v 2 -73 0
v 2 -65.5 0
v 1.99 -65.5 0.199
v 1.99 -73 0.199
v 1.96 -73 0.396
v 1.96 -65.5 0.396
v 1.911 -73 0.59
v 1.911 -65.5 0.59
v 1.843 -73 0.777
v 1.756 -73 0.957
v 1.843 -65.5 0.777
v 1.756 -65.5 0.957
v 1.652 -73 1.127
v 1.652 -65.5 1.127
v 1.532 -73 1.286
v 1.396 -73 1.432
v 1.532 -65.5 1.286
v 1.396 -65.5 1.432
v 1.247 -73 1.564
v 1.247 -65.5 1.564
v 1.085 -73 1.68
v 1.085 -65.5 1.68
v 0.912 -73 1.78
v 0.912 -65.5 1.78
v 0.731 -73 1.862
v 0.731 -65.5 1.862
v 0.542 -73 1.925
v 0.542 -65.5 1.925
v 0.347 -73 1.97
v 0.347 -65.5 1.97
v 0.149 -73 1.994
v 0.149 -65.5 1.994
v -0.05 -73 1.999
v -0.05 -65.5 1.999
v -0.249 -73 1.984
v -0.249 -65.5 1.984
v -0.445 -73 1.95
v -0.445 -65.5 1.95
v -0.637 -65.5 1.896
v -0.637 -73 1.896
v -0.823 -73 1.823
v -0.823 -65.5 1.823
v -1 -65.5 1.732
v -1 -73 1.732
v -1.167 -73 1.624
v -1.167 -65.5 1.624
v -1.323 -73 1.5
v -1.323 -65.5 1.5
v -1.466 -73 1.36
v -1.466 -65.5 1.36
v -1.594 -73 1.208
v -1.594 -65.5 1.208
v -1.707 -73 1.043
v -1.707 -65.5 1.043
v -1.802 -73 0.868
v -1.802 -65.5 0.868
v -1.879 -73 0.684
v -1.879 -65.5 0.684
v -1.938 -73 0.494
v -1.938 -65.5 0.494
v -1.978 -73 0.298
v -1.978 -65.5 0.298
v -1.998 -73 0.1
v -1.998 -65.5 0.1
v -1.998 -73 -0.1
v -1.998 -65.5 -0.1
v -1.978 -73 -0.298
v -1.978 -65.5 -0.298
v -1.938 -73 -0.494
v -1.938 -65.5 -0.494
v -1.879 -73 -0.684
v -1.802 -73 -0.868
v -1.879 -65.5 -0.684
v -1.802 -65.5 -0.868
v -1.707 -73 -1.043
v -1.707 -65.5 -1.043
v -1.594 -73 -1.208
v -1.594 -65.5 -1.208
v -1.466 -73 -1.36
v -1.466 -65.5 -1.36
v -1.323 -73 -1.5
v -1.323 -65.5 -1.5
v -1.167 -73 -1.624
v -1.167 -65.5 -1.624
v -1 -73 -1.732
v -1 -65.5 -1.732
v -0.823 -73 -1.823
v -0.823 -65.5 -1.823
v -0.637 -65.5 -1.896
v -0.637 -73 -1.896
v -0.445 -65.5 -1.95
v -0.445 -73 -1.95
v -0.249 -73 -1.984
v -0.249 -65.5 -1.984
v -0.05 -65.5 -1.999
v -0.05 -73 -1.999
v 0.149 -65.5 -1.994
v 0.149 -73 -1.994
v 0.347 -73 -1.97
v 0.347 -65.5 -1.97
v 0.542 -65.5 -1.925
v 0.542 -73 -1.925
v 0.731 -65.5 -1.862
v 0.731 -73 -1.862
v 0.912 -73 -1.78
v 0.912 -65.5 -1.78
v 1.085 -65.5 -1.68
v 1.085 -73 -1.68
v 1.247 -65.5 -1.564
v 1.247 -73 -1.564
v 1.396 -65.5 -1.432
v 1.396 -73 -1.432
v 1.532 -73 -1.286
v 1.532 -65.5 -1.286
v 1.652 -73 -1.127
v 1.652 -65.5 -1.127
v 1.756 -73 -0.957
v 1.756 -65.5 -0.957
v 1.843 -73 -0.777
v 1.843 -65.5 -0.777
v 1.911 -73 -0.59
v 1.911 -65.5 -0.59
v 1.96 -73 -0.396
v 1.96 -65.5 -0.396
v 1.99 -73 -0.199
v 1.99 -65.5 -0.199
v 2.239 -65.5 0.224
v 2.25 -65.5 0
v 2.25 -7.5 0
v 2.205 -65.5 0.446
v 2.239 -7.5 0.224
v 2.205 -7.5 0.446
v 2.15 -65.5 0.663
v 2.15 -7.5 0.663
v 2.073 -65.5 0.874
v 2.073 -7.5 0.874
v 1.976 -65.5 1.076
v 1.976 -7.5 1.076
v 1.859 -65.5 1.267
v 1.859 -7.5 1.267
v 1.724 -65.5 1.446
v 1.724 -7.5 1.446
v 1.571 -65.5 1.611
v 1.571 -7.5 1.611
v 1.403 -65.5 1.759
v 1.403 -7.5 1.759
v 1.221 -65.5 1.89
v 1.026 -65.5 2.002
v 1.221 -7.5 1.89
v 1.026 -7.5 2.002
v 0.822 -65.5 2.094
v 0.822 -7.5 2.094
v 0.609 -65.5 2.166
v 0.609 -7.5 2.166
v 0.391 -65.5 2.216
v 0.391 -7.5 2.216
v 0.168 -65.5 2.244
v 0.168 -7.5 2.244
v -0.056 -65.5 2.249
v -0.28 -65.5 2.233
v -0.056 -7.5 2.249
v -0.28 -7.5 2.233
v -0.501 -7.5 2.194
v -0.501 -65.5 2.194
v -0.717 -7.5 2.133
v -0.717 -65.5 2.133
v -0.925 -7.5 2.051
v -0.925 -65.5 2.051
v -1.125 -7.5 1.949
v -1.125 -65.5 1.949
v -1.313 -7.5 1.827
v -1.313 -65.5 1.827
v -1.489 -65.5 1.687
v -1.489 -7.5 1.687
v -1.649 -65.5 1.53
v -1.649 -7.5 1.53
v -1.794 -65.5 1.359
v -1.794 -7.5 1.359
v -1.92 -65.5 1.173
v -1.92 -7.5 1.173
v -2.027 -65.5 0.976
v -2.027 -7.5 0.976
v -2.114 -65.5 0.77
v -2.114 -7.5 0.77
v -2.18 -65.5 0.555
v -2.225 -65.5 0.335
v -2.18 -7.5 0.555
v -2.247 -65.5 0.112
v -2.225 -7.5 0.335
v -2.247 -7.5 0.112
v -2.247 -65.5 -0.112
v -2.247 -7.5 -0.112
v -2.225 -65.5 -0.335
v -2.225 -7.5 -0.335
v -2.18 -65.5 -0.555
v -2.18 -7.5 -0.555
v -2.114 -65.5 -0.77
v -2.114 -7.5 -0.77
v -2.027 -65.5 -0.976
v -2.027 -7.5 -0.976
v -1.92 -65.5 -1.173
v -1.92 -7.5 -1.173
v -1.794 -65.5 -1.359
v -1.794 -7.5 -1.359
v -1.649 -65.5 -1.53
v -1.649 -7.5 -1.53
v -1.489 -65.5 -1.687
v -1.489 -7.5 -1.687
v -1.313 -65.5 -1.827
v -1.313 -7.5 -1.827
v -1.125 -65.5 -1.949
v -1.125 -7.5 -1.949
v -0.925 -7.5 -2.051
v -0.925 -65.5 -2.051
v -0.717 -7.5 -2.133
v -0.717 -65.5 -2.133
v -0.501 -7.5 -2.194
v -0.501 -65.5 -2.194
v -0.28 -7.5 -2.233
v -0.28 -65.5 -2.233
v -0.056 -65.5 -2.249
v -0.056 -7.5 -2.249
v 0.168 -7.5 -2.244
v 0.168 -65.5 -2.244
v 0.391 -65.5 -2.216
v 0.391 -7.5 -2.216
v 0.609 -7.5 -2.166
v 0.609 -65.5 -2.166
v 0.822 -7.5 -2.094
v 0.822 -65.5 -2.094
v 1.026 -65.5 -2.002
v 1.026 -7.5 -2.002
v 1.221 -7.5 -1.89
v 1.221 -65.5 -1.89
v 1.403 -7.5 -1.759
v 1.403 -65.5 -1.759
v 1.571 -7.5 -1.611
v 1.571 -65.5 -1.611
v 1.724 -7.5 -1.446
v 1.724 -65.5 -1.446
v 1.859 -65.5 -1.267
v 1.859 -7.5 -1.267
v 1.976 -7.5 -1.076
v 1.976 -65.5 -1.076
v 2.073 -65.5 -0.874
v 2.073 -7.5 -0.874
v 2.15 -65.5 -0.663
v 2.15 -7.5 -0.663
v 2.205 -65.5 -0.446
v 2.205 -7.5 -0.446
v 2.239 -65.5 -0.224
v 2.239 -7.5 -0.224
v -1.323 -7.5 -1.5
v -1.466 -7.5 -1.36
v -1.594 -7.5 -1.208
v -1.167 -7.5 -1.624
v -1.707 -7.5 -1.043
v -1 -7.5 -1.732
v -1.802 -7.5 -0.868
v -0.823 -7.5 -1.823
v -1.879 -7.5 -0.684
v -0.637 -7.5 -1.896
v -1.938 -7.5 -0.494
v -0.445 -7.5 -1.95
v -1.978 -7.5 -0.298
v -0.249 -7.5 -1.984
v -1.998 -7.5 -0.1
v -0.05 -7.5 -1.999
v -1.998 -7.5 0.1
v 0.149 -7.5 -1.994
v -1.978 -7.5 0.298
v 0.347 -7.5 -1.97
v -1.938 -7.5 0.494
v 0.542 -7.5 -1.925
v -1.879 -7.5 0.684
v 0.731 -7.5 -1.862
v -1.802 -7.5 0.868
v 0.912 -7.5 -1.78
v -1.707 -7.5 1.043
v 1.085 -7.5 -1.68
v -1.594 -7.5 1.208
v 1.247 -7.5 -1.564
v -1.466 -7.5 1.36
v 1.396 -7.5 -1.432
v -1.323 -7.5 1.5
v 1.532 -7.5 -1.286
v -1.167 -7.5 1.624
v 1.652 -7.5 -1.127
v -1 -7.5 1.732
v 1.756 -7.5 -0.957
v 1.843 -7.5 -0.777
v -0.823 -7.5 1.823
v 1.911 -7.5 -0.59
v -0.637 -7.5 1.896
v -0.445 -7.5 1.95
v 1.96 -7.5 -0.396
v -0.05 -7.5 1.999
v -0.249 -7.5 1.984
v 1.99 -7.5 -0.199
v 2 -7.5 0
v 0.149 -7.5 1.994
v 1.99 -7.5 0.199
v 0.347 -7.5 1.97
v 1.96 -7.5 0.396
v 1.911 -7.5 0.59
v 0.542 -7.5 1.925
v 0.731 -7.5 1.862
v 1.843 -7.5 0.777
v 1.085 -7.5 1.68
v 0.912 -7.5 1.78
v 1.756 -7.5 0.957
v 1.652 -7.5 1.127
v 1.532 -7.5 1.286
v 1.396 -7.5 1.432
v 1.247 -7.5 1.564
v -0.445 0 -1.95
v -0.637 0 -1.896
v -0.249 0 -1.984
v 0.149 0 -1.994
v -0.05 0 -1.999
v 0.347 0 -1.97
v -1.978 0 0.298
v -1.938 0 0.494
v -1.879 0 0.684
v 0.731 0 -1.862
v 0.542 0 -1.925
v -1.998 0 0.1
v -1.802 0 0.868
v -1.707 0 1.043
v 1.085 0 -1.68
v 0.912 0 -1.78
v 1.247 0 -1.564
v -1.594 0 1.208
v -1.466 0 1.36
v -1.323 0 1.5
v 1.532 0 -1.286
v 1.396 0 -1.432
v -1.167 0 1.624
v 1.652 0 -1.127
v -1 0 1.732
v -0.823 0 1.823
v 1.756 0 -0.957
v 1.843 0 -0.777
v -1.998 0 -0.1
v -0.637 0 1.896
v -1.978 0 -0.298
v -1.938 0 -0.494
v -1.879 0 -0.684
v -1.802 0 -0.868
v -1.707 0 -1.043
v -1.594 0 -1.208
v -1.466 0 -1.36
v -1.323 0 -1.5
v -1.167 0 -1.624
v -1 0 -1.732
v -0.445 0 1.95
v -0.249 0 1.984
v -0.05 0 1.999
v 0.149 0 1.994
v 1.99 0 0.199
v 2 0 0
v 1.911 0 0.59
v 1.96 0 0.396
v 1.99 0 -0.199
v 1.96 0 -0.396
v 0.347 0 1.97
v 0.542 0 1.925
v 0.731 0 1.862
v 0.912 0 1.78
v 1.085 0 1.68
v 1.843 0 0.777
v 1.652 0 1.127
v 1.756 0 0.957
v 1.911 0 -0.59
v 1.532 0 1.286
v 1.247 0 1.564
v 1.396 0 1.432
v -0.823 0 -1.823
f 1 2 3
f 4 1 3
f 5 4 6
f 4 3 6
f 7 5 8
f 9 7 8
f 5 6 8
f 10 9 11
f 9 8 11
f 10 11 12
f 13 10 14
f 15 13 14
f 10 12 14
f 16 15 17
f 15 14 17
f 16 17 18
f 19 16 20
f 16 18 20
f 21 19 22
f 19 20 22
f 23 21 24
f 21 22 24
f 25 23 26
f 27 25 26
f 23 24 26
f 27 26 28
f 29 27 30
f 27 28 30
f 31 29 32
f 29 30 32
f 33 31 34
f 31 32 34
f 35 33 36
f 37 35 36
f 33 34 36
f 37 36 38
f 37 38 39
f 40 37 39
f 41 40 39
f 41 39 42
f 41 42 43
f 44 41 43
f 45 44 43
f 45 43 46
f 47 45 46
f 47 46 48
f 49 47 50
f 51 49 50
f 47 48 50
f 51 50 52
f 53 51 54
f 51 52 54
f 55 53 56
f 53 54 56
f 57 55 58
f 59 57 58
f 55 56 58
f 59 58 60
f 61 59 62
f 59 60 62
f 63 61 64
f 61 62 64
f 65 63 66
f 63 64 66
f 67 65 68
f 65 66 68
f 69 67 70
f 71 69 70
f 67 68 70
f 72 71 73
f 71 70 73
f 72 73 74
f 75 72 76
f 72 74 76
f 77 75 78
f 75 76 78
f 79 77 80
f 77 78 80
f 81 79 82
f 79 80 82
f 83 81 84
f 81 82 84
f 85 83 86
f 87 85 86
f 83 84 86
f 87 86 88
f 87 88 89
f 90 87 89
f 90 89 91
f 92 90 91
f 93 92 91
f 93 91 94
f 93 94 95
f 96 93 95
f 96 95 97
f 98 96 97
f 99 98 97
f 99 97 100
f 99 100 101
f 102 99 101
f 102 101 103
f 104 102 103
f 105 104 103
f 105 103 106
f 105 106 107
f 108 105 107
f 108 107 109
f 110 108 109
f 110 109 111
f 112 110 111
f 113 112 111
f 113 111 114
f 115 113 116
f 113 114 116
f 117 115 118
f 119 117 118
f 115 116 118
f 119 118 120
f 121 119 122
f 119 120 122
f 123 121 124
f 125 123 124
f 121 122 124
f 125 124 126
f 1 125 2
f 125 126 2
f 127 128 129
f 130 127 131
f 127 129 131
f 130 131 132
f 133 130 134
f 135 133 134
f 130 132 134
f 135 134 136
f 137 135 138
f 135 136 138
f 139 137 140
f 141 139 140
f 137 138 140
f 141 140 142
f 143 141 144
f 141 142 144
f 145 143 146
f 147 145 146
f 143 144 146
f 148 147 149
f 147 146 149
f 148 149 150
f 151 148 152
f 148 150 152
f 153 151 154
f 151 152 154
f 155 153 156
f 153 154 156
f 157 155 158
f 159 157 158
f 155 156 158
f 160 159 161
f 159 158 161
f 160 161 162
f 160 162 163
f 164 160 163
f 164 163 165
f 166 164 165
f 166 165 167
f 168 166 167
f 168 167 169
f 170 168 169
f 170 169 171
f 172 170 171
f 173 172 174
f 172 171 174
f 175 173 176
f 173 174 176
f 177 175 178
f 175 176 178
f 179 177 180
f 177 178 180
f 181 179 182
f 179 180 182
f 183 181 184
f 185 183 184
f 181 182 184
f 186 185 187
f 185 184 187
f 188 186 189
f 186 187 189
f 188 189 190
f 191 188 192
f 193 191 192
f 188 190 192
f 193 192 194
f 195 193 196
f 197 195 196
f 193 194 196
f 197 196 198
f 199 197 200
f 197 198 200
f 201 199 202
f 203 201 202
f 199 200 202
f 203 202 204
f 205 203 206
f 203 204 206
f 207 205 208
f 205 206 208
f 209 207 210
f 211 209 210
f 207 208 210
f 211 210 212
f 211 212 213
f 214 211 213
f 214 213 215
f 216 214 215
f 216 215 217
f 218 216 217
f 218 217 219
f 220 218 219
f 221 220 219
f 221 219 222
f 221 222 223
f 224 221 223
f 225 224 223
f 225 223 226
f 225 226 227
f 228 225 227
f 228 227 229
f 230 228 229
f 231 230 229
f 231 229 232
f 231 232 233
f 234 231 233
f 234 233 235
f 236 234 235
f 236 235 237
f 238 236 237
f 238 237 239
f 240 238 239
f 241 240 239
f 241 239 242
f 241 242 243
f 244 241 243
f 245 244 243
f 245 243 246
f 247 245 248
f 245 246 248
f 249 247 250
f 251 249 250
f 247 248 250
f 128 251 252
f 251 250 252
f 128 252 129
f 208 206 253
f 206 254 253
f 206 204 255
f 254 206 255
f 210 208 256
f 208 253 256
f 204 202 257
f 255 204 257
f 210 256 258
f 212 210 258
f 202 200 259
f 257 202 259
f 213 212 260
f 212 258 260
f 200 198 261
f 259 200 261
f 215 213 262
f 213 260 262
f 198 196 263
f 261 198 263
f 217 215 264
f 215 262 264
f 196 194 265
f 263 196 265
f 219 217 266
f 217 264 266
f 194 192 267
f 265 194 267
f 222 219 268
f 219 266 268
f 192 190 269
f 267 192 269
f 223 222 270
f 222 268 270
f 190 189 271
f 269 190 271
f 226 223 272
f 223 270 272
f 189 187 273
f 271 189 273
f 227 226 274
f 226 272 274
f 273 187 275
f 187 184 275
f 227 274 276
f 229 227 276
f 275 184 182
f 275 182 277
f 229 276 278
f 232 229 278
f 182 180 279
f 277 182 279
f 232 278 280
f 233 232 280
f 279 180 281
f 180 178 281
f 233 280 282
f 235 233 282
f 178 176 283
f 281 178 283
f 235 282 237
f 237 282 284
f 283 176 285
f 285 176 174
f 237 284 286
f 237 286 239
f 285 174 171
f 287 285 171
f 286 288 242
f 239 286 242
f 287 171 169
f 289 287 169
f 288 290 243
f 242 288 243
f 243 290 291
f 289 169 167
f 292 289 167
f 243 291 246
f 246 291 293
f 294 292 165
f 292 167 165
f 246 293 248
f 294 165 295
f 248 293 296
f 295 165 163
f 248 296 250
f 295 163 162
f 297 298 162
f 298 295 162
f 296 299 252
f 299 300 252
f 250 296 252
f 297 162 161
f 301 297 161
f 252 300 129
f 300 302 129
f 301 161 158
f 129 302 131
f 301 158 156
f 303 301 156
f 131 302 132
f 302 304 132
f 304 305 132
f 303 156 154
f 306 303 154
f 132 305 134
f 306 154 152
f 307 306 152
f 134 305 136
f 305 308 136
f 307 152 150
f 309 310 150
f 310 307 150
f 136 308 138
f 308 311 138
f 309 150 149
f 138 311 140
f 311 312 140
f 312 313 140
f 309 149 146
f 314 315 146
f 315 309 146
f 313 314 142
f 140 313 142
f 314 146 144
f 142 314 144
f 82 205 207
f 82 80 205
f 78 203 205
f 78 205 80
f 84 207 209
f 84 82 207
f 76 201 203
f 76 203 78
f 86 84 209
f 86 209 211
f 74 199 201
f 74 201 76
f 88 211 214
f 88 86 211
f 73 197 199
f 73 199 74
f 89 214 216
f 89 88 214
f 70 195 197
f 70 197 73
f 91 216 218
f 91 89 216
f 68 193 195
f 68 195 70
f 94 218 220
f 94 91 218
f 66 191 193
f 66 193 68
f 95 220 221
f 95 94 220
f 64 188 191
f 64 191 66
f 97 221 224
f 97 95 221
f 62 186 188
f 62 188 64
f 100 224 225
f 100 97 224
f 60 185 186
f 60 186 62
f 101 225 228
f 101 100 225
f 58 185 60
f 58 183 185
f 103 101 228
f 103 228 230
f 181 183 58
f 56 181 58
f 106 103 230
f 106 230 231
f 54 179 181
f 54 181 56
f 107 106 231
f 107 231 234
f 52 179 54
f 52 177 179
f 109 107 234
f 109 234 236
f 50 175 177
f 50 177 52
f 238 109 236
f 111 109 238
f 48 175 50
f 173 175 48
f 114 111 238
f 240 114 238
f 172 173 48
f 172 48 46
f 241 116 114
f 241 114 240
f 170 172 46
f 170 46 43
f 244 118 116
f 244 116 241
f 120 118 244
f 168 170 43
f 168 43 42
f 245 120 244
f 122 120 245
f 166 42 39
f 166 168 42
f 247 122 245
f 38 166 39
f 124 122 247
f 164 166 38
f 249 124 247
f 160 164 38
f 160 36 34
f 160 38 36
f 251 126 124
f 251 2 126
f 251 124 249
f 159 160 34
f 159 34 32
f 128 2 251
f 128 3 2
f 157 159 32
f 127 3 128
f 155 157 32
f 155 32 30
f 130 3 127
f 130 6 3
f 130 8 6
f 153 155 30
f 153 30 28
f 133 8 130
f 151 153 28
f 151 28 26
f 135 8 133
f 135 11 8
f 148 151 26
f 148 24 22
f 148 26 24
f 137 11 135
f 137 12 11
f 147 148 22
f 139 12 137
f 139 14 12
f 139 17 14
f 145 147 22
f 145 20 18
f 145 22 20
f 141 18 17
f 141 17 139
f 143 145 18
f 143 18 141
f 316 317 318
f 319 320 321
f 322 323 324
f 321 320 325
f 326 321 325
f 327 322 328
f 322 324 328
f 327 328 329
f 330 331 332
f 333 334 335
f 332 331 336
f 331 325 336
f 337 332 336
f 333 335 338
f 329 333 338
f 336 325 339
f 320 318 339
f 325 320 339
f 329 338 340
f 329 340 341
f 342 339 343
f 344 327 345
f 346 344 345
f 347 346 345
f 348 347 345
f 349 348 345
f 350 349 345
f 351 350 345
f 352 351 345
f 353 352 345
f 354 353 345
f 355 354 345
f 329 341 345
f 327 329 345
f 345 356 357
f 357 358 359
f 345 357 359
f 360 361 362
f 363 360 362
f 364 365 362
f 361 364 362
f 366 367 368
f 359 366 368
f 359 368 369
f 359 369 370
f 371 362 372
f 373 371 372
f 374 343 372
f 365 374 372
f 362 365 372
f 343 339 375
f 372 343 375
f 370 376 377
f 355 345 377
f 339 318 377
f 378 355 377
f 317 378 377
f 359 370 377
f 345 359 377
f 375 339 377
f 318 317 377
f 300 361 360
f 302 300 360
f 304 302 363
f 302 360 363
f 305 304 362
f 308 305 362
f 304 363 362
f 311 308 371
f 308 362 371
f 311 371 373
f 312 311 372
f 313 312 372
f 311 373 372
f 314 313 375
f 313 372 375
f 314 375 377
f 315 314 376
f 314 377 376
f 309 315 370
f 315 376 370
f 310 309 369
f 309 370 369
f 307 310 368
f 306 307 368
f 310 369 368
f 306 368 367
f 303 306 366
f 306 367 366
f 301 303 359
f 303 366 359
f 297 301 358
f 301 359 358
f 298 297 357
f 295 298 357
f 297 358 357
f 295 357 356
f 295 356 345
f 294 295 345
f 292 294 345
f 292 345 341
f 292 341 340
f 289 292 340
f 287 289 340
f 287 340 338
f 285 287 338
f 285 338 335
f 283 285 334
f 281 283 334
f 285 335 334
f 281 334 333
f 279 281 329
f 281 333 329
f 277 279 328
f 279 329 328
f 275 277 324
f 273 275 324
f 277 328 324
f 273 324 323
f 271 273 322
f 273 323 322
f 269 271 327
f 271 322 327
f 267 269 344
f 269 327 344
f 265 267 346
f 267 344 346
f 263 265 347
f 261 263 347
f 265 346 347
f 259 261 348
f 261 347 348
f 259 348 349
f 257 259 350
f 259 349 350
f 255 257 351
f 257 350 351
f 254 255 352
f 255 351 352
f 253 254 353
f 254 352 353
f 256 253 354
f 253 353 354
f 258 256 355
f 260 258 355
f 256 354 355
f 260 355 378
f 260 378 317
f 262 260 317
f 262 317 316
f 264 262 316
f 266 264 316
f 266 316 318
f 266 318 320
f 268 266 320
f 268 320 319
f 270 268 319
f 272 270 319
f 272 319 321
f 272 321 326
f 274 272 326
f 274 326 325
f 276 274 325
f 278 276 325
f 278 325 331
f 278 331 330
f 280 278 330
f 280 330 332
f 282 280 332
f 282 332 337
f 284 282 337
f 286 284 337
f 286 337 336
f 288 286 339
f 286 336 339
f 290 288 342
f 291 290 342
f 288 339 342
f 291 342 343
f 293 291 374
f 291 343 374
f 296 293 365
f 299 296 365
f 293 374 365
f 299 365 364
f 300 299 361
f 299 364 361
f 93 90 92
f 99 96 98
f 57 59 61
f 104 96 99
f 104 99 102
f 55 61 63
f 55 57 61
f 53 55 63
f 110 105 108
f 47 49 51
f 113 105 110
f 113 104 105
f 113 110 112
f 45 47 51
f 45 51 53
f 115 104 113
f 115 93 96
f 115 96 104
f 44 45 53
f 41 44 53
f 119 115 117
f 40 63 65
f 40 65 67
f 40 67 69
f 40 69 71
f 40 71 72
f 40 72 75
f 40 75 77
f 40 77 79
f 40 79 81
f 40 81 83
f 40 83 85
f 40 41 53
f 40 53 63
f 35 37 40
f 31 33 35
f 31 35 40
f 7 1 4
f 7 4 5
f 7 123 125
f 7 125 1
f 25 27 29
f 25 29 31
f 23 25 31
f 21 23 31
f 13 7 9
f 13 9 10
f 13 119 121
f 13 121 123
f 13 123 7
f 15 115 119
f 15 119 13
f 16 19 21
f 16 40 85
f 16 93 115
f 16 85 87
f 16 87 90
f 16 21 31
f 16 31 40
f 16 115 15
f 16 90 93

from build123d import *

# Parameters (mm, degrees)
F0_R     = 2
F1_DEPTH = 7.5
F2_R     = 2.25
F2_R_2   = 2
F3_DEPTH = 58
F4_R     = 2
F5_DEPTH = 7.5


with BuildPart() as f1:
    # F0 (on Front) → F1 (new body)
    with BuildSketch(Plane.XZ):
        Circle(F0_R)
    extrude(amount=F1_DEPTH)

    # F2 (on face) → F3 (join)
    with BuildSketch(Plane.XZ.offset(7.5)):
        Circle(F2_R)
        Circle(F2_R_2, mode=Mode.SUBTRACT)
        Circle(F2_R_2)
    extrude(amount=F3_DEPTH)

    # F4 (on face) → F5 (join)
    with BuildSketch(Plane.XZ.offset(65.5)):
        Circle(F4_R)
    extrude(amount=F5_DEPTH)


solid = f1.part
